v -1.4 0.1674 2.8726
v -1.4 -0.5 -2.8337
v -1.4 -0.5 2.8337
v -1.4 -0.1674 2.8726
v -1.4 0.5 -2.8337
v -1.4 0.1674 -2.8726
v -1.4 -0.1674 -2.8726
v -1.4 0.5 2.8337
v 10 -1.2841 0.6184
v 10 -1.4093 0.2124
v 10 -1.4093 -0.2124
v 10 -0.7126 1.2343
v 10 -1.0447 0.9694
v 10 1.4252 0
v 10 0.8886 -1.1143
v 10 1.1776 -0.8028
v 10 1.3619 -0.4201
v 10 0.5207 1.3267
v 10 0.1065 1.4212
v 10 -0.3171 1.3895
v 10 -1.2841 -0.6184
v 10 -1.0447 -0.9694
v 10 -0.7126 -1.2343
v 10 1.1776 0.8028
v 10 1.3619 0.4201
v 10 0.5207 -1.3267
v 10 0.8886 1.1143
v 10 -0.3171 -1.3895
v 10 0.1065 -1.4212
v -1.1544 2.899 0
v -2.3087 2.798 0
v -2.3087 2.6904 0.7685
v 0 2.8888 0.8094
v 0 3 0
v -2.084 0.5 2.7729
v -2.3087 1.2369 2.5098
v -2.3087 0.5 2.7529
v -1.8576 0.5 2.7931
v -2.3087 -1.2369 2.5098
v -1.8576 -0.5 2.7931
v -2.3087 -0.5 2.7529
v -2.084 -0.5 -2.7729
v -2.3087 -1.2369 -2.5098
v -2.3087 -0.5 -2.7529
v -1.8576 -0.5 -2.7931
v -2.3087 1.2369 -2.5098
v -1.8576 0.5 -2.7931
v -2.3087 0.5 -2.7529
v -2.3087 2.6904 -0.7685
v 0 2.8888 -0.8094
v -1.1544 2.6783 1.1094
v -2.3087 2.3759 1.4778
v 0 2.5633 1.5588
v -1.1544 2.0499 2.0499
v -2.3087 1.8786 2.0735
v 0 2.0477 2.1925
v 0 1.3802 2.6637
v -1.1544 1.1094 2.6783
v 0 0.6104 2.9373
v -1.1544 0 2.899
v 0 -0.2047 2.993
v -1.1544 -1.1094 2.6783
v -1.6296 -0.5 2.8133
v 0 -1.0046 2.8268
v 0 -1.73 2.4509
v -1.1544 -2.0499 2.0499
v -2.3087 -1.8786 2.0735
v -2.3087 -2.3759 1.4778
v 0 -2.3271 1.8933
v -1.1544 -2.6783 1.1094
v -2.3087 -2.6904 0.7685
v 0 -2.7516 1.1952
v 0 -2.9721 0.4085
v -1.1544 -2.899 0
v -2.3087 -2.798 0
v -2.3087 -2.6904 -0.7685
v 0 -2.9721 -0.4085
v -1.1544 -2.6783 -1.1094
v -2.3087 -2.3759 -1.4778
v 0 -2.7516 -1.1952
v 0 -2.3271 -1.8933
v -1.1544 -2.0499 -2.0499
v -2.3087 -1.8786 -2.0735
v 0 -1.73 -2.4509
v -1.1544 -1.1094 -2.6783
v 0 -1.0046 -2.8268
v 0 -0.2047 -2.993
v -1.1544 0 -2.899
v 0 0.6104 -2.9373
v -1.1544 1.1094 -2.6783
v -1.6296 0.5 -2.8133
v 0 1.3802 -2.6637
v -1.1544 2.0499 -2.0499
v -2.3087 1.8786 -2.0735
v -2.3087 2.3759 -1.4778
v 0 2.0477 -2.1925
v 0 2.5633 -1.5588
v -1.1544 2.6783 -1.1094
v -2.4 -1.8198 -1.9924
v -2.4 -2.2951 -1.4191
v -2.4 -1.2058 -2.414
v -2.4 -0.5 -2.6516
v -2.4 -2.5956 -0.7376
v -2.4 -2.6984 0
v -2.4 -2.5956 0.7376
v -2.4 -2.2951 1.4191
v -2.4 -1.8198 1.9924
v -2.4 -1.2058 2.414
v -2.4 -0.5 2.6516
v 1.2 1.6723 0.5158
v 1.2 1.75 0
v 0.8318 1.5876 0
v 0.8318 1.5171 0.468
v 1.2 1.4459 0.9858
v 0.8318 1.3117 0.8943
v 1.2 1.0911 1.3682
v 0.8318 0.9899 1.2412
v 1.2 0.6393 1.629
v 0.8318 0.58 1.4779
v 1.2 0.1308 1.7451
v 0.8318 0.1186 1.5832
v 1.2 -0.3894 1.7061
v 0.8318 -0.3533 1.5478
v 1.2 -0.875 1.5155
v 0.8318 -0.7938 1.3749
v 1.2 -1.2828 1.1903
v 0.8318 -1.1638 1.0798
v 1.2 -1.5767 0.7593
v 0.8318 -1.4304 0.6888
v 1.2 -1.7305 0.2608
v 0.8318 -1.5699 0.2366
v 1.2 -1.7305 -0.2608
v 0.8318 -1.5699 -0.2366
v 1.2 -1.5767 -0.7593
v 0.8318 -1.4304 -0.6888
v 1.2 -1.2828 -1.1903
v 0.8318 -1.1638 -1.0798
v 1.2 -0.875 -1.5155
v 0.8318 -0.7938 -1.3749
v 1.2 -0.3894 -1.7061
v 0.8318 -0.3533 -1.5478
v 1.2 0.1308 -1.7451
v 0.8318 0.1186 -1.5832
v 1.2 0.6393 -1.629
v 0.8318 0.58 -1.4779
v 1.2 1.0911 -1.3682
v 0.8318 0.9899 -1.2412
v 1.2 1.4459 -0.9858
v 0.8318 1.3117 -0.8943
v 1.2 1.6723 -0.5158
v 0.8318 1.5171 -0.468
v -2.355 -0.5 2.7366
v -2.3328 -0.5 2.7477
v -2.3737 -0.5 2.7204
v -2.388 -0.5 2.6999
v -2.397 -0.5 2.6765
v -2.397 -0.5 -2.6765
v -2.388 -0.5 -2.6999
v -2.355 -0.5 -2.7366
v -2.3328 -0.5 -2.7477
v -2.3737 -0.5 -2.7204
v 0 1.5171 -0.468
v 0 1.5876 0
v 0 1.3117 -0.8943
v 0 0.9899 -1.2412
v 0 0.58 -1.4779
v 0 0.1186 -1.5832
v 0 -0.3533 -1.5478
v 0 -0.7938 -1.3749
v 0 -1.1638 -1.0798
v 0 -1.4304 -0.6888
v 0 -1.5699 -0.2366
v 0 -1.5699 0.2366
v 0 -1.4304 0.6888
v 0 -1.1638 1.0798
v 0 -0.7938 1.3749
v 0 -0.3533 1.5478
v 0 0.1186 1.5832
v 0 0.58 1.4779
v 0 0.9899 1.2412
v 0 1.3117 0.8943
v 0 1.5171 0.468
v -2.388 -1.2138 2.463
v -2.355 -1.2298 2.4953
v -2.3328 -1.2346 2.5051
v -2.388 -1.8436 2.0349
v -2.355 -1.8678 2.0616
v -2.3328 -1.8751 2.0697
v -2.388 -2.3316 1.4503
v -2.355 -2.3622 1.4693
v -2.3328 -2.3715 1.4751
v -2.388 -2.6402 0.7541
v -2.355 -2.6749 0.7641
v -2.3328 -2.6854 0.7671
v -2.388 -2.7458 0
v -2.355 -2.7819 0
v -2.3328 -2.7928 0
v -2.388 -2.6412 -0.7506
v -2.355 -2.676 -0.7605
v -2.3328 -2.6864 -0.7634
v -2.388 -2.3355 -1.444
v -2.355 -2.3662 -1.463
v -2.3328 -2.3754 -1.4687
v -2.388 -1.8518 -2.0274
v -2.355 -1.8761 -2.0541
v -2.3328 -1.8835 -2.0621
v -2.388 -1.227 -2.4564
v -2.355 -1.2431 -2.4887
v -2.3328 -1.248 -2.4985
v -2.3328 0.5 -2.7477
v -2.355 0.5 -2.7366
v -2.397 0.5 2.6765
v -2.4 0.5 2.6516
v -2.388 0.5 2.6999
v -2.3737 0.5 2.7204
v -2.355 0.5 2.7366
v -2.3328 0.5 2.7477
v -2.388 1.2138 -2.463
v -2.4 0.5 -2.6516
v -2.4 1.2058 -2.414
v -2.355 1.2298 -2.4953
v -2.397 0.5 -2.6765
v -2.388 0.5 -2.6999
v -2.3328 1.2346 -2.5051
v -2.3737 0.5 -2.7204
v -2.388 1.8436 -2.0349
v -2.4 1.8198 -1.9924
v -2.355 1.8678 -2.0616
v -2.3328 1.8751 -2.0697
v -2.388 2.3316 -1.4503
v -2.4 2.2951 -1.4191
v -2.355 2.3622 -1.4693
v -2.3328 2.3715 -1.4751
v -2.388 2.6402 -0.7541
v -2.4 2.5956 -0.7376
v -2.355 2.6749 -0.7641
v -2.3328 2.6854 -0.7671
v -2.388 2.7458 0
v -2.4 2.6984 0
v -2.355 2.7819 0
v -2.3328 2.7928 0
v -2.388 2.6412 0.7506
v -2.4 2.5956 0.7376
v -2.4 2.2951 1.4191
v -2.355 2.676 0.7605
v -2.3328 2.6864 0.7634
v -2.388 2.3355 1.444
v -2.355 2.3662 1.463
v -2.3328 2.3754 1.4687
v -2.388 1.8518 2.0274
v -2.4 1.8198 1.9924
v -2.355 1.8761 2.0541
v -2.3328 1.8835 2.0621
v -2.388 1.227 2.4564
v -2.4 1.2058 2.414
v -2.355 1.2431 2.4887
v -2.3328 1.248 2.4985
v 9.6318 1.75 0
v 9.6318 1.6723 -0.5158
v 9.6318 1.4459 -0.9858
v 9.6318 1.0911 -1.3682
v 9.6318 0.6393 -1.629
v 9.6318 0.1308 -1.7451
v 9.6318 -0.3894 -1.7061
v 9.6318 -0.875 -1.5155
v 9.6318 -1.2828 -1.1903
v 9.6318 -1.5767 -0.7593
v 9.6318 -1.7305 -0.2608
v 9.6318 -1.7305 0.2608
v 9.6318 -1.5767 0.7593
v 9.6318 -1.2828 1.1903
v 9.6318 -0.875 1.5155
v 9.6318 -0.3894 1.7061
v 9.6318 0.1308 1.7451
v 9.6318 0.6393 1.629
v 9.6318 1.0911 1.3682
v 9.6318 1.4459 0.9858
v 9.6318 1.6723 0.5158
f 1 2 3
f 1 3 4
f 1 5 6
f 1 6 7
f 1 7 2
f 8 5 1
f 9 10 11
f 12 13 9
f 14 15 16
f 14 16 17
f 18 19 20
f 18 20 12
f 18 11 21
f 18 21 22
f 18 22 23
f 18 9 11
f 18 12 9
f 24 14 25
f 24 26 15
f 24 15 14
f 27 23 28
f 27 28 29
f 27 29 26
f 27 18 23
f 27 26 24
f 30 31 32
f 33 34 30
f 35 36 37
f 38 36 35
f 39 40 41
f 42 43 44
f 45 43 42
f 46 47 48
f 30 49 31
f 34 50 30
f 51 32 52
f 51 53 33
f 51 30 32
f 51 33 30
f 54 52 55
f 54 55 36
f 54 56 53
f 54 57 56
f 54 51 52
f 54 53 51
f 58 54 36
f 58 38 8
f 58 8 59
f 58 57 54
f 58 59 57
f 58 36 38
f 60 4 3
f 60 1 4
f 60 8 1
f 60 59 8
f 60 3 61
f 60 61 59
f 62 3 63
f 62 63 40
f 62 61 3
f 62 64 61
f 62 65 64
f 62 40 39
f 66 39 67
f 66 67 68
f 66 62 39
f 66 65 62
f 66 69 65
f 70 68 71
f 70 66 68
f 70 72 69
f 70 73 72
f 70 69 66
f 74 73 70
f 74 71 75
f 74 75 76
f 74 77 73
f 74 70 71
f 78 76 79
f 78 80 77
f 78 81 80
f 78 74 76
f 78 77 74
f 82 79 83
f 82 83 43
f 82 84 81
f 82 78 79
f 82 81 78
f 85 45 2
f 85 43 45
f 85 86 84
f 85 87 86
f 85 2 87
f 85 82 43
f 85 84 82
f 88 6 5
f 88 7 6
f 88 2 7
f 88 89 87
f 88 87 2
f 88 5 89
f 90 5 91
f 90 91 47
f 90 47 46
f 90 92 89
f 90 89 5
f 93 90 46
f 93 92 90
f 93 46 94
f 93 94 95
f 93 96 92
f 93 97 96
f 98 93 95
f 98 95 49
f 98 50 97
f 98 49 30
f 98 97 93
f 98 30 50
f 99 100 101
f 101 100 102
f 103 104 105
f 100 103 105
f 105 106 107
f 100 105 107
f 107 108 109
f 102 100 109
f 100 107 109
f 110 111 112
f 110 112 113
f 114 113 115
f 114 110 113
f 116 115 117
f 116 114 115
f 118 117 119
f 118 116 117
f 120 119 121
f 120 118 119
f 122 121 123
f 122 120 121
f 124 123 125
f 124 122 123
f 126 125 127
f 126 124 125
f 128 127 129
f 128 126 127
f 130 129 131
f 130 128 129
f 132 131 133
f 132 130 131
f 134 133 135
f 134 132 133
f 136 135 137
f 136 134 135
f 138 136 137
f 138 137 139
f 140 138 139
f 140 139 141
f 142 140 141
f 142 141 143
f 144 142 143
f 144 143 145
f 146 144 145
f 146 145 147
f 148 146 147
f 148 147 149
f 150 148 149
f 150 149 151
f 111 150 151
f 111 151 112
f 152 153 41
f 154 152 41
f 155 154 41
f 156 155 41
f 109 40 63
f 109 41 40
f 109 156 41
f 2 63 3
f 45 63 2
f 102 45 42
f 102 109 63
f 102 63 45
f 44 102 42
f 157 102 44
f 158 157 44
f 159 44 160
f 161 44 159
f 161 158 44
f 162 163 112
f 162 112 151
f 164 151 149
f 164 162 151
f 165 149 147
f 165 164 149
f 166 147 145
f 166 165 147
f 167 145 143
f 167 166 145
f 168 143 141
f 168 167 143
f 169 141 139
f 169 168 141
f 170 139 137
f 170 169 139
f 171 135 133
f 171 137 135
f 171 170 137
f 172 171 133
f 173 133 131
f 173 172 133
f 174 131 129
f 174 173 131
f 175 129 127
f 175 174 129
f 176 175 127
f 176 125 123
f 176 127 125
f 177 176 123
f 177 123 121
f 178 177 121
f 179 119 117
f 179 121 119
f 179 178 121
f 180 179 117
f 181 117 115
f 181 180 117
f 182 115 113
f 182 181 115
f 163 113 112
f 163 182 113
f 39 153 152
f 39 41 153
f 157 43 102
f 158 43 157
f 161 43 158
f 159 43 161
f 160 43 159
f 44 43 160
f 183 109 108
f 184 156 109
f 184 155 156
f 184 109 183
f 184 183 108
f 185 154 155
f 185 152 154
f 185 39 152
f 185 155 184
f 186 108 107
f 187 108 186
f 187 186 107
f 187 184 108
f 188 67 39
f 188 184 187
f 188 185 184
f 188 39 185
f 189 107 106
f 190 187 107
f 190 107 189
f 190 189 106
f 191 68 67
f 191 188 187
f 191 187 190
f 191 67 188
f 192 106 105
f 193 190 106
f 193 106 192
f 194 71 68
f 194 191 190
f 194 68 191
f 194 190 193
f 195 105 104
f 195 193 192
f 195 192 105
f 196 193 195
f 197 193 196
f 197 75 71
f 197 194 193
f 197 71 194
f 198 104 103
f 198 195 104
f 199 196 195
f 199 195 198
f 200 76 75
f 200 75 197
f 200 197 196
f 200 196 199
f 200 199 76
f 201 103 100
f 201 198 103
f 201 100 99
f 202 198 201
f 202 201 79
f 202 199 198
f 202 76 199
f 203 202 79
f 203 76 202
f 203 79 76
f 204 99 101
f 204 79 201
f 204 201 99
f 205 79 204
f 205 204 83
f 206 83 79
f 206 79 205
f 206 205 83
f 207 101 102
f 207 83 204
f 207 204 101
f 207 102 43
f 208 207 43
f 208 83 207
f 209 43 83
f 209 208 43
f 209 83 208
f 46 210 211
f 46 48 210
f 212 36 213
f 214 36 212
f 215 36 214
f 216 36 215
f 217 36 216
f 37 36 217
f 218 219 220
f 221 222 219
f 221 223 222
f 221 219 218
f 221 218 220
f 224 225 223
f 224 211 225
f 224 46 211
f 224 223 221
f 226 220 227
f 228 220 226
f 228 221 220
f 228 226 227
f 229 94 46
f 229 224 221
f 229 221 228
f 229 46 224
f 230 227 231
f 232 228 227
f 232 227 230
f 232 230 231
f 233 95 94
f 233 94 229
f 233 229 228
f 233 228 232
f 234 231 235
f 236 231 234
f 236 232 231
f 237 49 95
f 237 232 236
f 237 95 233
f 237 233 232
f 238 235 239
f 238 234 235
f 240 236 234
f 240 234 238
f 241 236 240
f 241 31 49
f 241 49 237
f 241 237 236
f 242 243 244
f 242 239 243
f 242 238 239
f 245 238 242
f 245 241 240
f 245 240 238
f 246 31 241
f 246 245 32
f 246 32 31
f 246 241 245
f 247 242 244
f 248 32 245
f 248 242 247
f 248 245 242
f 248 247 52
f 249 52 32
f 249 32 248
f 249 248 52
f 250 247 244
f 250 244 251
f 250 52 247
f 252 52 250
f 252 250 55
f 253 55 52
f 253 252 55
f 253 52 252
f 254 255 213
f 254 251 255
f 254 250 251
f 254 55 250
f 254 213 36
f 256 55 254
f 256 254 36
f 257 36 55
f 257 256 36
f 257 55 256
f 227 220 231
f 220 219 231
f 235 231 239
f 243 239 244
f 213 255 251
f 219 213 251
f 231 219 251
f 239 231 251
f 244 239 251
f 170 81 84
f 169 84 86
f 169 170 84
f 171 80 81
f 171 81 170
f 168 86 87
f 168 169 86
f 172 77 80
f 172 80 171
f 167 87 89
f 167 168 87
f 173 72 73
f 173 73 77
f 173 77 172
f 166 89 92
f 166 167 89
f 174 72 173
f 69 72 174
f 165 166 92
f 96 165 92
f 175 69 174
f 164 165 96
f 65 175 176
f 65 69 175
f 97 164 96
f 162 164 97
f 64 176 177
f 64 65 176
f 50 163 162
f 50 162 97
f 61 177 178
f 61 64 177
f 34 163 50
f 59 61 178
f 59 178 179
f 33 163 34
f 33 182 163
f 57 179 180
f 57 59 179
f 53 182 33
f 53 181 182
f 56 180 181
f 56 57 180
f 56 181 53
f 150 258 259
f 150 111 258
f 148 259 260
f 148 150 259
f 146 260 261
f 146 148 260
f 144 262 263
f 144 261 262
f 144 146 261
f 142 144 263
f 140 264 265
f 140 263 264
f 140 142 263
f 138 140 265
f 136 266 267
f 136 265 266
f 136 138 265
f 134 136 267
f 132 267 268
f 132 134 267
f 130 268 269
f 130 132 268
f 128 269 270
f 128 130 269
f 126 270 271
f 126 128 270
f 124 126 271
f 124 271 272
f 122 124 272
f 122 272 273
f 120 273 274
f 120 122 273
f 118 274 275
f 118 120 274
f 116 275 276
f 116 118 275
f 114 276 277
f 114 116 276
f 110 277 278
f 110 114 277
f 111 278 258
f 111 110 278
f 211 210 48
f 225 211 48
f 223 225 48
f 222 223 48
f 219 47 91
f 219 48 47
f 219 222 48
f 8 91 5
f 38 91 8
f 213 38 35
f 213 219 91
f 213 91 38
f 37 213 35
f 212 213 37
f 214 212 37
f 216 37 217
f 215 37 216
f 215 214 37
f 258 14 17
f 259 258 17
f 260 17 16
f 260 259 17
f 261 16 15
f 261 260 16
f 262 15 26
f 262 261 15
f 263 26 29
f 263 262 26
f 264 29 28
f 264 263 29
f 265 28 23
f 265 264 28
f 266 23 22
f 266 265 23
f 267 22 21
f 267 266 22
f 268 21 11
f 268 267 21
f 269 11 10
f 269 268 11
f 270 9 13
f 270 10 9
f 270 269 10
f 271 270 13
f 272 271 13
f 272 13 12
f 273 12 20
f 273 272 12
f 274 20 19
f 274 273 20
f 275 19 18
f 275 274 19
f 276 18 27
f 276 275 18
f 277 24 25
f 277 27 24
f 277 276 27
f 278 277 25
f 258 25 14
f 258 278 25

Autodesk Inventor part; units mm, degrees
ref_plane "YZ Plane" through (0, 0, 0) normal (1, 0, 0) x (0, 1, 0)
ref_plane "XZ Plane" through (0, 0, 0) normal (0, 1, 0) x (-1, 0, 0)
sketch "Эскиз1" plane through (0, 0, 0) normal (0, 0, 1) x (1, 0, 0)
  line L0 (-2.4, 0) -> (10, 0)
  line L1 (10, 0) -> (10, 1.75)
  line L2 (10, 1.75) -> (1.2, 1.75)
  line L3 (1.2, 1.75) -> (0.8318, 1.5876)
  line L4 (0.8318, 1.5876) -> (0, 1.5876)
  line L5 (0, 1.5876) -> (0, 3)
  line L6 (-4.88, 0) -> (12.48, 0) projected
  line L7 (0, -0.6) -> (0, 3.6) projected
  line L8 (-2.4, 0) -> (-2.4, 2.79)
  line L9 (0, 3) -> (-2.4, 2.79)
  line L10 (1.2, 1.75) -> (0, 1.75) construction
  dimension "d0" = 10
  dimension "d1" = 8.8
  dimension "d2" = 0.3682
  dimension "d3" = 2.4
  dimension "d4" = 3.5
  dimension "d5" = 3.1752
  dimension "d9" = 6
  dimension "d10" = 5
revolve "Базовый элемент" add sketch "Эскиз1" angle 360 about axis through (-2.4, 0, 0) along (1, 0, 0)
sketch "Эскиз2" plane through (-2.4, 0, 0) normal (-1, 0, 0) x (0, 0, 1)
  circle A0 centre (0, 0) radius 3 projected
  line L0 (0, 0) -> (0, 2.79) projected
  line L1 (-3, 0.5) -> (3, 0.5)
  line L2 (3, 0.5) -> (3, -0.5)
  line L3 (3, -0.5) -> (-3, -0.5)
  line L4 (-3, -0.5) -> (-3, 0.5)
  line L5 (-3, 0) -> (3, 0) construction
  line L6 (0, 0.5) -> (0, -0.5) construction
  dimension "d11" = 1
  dimension "d12" = 6
fillet "Сопряжение1" radius 0.1 1 edges at (-2.4, -2.79, 0)
extrude "Паз" cut sketch "Эскиз2" against normal blind 1 contours A0 L3 L1 | L2 L3 A0 | A0 L1 L2 | A0 L4 L1 | L3 L4 A0
thread "Резьба" size "M3.5x0.6" class "6g" standard "ISO Metric profile" length 8.8
chamfer "Фаска1" distance 0.3248 distance2 0.3682 1 edges at (10, -1.75, 0) measured on face at (10, 0.4197, 0.5264)
ref_plane "Work Plane1" through (30.1625, 0, 0) normal (0, 0, -1) x (1, 0, 0)
equation "\"d11\" = SBR"
equation "\"d12\" = KOD"
equation "\"d14\" = RR"
equation "\"d19\" = STI"
equation "\"d15\" = GEL"
equation "\"d17\" = -0.5 * SPD + 0.5 * GD"
equation "\"d0\" = NLG"
equation "\"d1\" = GEL"
equation "\"d3\" = KOH"
equation "\"d4\" = GD"
equation "\"d5\" = BDM"
equation "\"d9\" = KOD"
equation "\"d10\" = KEWI"
equation "\"GD\" = 3.5"
equation "\"NLG\" = 10"
equation "\"GEL\" = 8.8"
equation "\"KOD\" = 6"
equation "\"KOH\" = 2.4"
equation "\"GAL\" = 0.61345 * PTC"
equation "\"SPD\" = 2.85048"
equation "\"BDM\" = 3.17524"
equation "\"GUL\" = 0.61345 * PTC"
equation "\"RR\" = 0.1"
equation "\"SBR\" = 1"
equation "\"STI\" = 1"
equation "\"KEWI\" = 5deg"
equation "\"PTC\" = 0.6"
equation "\"THREADDIA\" = 3.5"
equation "\"TOA\" = 30deg"
equation "\"NND\" = 3.5"
equation "\"GD1\" = THREADDIA - 1.2269 * PTC"
properties part number "DIN 84 - M3,5 x 10" material "Сталь, мягкая"
